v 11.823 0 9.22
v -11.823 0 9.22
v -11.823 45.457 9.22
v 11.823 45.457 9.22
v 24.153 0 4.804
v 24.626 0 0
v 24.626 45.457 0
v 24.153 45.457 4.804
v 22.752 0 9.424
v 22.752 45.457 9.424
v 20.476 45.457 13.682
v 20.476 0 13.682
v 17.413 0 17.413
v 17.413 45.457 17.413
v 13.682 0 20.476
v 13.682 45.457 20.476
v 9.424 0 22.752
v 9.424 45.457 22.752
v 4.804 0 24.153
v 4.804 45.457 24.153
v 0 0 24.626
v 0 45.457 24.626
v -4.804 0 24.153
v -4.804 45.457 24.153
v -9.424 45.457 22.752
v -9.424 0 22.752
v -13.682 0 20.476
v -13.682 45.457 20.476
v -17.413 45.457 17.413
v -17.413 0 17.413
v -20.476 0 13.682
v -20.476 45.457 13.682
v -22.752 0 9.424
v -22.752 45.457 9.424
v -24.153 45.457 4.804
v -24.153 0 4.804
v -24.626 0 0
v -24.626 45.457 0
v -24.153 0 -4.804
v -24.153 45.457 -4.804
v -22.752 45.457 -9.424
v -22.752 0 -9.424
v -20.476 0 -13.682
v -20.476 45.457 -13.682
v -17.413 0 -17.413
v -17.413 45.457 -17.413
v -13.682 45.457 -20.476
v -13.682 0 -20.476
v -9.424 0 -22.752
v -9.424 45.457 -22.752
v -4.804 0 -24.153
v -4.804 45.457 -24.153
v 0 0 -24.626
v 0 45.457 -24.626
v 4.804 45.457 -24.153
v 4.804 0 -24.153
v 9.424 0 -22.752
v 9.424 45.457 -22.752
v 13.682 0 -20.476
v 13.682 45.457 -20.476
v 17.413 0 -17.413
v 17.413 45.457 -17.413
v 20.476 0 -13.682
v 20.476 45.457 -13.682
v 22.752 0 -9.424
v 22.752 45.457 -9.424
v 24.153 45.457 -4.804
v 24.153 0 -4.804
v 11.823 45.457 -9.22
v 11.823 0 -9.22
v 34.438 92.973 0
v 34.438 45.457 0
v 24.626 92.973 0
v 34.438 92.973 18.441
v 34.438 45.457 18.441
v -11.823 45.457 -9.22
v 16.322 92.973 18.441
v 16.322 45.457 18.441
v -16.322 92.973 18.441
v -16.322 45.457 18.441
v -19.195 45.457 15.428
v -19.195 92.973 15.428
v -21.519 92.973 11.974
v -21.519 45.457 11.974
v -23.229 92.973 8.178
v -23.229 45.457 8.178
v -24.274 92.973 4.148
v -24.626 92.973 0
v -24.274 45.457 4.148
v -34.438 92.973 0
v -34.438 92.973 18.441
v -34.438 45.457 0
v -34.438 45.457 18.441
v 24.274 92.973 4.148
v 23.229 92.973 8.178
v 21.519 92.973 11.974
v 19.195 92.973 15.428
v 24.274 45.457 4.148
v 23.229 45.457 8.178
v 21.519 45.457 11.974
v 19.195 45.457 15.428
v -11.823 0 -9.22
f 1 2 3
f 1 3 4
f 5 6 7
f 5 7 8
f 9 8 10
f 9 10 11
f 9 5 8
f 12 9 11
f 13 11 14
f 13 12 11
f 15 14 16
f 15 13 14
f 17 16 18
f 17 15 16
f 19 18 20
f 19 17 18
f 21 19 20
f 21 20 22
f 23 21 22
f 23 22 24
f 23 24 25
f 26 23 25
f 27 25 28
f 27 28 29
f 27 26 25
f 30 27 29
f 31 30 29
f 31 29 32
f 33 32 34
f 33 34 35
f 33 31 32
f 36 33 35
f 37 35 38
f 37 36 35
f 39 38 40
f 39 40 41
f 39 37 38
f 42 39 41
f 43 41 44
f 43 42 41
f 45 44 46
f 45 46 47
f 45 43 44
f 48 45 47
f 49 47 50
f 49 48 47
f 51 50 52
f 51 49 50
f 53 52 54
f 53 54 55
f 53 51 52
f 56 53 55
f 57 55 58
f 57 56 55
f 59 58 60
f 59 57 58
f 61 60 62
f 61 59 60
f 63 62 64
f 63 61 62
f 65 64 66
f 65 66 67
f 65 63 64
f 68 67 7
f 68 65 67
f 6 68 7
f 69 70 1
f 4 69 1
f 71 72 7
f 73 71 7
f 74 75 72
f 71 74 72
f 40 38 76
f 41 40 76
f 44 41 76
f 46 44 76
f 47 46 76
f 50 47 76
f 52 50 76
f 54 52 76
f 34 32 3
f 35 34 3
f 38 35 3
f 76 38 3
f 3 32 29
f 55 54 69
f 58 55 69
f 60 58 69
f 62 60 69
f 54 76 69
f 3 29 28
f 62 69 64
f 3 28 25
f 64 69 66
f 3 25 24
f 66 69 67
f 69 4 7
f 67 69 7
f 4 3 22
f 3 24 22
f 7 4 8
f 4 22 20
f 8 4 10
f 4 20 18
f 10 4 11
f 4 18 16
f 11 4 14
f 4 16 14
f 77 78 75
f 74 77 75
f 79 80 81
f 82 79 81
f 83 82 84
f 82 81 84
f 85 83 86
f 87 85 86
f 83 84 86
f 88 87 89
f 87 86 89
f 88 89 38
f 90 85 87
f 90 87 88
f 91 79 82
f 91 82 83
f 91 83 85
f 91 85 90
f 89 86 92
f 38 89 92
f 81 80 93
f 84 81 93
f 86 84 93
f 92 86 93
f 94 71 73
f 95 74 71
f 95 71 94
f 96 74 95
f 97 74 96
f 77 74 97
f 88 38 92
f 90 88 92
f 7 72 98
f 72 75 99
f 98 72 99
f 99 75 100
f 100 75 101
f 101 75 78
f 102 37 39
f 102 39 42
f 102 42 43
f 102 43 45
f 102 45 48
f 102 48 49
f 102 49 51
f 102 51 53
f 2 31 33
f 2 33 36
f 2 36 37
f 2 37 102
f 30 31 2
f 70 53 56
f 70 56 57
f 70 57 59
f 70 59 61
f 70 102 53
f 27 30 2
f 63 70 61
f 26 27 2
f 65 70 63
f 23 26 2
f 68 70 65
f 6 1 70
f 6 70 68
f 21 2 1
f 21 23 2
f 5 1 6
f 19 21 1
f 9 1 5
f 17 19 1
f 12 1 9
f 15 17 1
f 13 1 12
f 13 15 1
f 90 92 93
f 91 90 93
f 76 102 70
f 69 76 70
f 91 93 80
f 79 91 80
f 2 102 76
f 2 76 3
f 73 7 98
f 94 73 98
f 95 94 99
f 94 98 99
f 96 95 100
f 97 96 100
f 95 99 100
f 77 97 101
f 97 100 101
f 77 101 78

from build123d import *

# Parameters (mm, degrees)
F0_R     = 24.626174
F0_W     = 23.64625
F0_H     = 18.44053
F2_DEPTH = 45.45686
F4_DEPTH = 47.51623


with BuildPart() as f2:
    # F0 (on Front) → F2 (new body)
    with BuildSketch(Plane.XZ):
        Circle(F0_R)
        Rectangle(F0_W, F0_H, mode=Mode.SUBTRACT)
    extrude(amount=-F2_DEPTH)


with BuildPart() as f4:
    # F3 (on face) → F4 (new body)
    with BuildSketch(Plane(origin=(0, 45.45686, 0), x_dir=(-1, 0, 0), z_dir=(0, 1, 0))):
        with BuildLine():
            Line((24.626174, 0), (34.437932, 0))
            Line((34.437932, 0), (34.437932, 18.44053))
            Line((34.437932, 18.44053), (16.321621, 18.44053))
            ThreePointArc((16.321621, 18.44053), (22.45426, 10.112106), (24.626174, 0))
        make_face()
        with BuildLine():
            Line((-34.437932, 0), (-24.626174, 0))
            ThreePointArc((-24.626174, 0), (-22.45426, 10.112106), (-16.321621, 18.44053))
            Line((-16.321621, 18.44053), (-34.437932, 18.44053))
            Line((-34.437932, 18.44053), (-34.437932, 0))
        make_face()
    extrude(amount=F4_DEPTH)


solid = Compound([f2.part, f4.part])
